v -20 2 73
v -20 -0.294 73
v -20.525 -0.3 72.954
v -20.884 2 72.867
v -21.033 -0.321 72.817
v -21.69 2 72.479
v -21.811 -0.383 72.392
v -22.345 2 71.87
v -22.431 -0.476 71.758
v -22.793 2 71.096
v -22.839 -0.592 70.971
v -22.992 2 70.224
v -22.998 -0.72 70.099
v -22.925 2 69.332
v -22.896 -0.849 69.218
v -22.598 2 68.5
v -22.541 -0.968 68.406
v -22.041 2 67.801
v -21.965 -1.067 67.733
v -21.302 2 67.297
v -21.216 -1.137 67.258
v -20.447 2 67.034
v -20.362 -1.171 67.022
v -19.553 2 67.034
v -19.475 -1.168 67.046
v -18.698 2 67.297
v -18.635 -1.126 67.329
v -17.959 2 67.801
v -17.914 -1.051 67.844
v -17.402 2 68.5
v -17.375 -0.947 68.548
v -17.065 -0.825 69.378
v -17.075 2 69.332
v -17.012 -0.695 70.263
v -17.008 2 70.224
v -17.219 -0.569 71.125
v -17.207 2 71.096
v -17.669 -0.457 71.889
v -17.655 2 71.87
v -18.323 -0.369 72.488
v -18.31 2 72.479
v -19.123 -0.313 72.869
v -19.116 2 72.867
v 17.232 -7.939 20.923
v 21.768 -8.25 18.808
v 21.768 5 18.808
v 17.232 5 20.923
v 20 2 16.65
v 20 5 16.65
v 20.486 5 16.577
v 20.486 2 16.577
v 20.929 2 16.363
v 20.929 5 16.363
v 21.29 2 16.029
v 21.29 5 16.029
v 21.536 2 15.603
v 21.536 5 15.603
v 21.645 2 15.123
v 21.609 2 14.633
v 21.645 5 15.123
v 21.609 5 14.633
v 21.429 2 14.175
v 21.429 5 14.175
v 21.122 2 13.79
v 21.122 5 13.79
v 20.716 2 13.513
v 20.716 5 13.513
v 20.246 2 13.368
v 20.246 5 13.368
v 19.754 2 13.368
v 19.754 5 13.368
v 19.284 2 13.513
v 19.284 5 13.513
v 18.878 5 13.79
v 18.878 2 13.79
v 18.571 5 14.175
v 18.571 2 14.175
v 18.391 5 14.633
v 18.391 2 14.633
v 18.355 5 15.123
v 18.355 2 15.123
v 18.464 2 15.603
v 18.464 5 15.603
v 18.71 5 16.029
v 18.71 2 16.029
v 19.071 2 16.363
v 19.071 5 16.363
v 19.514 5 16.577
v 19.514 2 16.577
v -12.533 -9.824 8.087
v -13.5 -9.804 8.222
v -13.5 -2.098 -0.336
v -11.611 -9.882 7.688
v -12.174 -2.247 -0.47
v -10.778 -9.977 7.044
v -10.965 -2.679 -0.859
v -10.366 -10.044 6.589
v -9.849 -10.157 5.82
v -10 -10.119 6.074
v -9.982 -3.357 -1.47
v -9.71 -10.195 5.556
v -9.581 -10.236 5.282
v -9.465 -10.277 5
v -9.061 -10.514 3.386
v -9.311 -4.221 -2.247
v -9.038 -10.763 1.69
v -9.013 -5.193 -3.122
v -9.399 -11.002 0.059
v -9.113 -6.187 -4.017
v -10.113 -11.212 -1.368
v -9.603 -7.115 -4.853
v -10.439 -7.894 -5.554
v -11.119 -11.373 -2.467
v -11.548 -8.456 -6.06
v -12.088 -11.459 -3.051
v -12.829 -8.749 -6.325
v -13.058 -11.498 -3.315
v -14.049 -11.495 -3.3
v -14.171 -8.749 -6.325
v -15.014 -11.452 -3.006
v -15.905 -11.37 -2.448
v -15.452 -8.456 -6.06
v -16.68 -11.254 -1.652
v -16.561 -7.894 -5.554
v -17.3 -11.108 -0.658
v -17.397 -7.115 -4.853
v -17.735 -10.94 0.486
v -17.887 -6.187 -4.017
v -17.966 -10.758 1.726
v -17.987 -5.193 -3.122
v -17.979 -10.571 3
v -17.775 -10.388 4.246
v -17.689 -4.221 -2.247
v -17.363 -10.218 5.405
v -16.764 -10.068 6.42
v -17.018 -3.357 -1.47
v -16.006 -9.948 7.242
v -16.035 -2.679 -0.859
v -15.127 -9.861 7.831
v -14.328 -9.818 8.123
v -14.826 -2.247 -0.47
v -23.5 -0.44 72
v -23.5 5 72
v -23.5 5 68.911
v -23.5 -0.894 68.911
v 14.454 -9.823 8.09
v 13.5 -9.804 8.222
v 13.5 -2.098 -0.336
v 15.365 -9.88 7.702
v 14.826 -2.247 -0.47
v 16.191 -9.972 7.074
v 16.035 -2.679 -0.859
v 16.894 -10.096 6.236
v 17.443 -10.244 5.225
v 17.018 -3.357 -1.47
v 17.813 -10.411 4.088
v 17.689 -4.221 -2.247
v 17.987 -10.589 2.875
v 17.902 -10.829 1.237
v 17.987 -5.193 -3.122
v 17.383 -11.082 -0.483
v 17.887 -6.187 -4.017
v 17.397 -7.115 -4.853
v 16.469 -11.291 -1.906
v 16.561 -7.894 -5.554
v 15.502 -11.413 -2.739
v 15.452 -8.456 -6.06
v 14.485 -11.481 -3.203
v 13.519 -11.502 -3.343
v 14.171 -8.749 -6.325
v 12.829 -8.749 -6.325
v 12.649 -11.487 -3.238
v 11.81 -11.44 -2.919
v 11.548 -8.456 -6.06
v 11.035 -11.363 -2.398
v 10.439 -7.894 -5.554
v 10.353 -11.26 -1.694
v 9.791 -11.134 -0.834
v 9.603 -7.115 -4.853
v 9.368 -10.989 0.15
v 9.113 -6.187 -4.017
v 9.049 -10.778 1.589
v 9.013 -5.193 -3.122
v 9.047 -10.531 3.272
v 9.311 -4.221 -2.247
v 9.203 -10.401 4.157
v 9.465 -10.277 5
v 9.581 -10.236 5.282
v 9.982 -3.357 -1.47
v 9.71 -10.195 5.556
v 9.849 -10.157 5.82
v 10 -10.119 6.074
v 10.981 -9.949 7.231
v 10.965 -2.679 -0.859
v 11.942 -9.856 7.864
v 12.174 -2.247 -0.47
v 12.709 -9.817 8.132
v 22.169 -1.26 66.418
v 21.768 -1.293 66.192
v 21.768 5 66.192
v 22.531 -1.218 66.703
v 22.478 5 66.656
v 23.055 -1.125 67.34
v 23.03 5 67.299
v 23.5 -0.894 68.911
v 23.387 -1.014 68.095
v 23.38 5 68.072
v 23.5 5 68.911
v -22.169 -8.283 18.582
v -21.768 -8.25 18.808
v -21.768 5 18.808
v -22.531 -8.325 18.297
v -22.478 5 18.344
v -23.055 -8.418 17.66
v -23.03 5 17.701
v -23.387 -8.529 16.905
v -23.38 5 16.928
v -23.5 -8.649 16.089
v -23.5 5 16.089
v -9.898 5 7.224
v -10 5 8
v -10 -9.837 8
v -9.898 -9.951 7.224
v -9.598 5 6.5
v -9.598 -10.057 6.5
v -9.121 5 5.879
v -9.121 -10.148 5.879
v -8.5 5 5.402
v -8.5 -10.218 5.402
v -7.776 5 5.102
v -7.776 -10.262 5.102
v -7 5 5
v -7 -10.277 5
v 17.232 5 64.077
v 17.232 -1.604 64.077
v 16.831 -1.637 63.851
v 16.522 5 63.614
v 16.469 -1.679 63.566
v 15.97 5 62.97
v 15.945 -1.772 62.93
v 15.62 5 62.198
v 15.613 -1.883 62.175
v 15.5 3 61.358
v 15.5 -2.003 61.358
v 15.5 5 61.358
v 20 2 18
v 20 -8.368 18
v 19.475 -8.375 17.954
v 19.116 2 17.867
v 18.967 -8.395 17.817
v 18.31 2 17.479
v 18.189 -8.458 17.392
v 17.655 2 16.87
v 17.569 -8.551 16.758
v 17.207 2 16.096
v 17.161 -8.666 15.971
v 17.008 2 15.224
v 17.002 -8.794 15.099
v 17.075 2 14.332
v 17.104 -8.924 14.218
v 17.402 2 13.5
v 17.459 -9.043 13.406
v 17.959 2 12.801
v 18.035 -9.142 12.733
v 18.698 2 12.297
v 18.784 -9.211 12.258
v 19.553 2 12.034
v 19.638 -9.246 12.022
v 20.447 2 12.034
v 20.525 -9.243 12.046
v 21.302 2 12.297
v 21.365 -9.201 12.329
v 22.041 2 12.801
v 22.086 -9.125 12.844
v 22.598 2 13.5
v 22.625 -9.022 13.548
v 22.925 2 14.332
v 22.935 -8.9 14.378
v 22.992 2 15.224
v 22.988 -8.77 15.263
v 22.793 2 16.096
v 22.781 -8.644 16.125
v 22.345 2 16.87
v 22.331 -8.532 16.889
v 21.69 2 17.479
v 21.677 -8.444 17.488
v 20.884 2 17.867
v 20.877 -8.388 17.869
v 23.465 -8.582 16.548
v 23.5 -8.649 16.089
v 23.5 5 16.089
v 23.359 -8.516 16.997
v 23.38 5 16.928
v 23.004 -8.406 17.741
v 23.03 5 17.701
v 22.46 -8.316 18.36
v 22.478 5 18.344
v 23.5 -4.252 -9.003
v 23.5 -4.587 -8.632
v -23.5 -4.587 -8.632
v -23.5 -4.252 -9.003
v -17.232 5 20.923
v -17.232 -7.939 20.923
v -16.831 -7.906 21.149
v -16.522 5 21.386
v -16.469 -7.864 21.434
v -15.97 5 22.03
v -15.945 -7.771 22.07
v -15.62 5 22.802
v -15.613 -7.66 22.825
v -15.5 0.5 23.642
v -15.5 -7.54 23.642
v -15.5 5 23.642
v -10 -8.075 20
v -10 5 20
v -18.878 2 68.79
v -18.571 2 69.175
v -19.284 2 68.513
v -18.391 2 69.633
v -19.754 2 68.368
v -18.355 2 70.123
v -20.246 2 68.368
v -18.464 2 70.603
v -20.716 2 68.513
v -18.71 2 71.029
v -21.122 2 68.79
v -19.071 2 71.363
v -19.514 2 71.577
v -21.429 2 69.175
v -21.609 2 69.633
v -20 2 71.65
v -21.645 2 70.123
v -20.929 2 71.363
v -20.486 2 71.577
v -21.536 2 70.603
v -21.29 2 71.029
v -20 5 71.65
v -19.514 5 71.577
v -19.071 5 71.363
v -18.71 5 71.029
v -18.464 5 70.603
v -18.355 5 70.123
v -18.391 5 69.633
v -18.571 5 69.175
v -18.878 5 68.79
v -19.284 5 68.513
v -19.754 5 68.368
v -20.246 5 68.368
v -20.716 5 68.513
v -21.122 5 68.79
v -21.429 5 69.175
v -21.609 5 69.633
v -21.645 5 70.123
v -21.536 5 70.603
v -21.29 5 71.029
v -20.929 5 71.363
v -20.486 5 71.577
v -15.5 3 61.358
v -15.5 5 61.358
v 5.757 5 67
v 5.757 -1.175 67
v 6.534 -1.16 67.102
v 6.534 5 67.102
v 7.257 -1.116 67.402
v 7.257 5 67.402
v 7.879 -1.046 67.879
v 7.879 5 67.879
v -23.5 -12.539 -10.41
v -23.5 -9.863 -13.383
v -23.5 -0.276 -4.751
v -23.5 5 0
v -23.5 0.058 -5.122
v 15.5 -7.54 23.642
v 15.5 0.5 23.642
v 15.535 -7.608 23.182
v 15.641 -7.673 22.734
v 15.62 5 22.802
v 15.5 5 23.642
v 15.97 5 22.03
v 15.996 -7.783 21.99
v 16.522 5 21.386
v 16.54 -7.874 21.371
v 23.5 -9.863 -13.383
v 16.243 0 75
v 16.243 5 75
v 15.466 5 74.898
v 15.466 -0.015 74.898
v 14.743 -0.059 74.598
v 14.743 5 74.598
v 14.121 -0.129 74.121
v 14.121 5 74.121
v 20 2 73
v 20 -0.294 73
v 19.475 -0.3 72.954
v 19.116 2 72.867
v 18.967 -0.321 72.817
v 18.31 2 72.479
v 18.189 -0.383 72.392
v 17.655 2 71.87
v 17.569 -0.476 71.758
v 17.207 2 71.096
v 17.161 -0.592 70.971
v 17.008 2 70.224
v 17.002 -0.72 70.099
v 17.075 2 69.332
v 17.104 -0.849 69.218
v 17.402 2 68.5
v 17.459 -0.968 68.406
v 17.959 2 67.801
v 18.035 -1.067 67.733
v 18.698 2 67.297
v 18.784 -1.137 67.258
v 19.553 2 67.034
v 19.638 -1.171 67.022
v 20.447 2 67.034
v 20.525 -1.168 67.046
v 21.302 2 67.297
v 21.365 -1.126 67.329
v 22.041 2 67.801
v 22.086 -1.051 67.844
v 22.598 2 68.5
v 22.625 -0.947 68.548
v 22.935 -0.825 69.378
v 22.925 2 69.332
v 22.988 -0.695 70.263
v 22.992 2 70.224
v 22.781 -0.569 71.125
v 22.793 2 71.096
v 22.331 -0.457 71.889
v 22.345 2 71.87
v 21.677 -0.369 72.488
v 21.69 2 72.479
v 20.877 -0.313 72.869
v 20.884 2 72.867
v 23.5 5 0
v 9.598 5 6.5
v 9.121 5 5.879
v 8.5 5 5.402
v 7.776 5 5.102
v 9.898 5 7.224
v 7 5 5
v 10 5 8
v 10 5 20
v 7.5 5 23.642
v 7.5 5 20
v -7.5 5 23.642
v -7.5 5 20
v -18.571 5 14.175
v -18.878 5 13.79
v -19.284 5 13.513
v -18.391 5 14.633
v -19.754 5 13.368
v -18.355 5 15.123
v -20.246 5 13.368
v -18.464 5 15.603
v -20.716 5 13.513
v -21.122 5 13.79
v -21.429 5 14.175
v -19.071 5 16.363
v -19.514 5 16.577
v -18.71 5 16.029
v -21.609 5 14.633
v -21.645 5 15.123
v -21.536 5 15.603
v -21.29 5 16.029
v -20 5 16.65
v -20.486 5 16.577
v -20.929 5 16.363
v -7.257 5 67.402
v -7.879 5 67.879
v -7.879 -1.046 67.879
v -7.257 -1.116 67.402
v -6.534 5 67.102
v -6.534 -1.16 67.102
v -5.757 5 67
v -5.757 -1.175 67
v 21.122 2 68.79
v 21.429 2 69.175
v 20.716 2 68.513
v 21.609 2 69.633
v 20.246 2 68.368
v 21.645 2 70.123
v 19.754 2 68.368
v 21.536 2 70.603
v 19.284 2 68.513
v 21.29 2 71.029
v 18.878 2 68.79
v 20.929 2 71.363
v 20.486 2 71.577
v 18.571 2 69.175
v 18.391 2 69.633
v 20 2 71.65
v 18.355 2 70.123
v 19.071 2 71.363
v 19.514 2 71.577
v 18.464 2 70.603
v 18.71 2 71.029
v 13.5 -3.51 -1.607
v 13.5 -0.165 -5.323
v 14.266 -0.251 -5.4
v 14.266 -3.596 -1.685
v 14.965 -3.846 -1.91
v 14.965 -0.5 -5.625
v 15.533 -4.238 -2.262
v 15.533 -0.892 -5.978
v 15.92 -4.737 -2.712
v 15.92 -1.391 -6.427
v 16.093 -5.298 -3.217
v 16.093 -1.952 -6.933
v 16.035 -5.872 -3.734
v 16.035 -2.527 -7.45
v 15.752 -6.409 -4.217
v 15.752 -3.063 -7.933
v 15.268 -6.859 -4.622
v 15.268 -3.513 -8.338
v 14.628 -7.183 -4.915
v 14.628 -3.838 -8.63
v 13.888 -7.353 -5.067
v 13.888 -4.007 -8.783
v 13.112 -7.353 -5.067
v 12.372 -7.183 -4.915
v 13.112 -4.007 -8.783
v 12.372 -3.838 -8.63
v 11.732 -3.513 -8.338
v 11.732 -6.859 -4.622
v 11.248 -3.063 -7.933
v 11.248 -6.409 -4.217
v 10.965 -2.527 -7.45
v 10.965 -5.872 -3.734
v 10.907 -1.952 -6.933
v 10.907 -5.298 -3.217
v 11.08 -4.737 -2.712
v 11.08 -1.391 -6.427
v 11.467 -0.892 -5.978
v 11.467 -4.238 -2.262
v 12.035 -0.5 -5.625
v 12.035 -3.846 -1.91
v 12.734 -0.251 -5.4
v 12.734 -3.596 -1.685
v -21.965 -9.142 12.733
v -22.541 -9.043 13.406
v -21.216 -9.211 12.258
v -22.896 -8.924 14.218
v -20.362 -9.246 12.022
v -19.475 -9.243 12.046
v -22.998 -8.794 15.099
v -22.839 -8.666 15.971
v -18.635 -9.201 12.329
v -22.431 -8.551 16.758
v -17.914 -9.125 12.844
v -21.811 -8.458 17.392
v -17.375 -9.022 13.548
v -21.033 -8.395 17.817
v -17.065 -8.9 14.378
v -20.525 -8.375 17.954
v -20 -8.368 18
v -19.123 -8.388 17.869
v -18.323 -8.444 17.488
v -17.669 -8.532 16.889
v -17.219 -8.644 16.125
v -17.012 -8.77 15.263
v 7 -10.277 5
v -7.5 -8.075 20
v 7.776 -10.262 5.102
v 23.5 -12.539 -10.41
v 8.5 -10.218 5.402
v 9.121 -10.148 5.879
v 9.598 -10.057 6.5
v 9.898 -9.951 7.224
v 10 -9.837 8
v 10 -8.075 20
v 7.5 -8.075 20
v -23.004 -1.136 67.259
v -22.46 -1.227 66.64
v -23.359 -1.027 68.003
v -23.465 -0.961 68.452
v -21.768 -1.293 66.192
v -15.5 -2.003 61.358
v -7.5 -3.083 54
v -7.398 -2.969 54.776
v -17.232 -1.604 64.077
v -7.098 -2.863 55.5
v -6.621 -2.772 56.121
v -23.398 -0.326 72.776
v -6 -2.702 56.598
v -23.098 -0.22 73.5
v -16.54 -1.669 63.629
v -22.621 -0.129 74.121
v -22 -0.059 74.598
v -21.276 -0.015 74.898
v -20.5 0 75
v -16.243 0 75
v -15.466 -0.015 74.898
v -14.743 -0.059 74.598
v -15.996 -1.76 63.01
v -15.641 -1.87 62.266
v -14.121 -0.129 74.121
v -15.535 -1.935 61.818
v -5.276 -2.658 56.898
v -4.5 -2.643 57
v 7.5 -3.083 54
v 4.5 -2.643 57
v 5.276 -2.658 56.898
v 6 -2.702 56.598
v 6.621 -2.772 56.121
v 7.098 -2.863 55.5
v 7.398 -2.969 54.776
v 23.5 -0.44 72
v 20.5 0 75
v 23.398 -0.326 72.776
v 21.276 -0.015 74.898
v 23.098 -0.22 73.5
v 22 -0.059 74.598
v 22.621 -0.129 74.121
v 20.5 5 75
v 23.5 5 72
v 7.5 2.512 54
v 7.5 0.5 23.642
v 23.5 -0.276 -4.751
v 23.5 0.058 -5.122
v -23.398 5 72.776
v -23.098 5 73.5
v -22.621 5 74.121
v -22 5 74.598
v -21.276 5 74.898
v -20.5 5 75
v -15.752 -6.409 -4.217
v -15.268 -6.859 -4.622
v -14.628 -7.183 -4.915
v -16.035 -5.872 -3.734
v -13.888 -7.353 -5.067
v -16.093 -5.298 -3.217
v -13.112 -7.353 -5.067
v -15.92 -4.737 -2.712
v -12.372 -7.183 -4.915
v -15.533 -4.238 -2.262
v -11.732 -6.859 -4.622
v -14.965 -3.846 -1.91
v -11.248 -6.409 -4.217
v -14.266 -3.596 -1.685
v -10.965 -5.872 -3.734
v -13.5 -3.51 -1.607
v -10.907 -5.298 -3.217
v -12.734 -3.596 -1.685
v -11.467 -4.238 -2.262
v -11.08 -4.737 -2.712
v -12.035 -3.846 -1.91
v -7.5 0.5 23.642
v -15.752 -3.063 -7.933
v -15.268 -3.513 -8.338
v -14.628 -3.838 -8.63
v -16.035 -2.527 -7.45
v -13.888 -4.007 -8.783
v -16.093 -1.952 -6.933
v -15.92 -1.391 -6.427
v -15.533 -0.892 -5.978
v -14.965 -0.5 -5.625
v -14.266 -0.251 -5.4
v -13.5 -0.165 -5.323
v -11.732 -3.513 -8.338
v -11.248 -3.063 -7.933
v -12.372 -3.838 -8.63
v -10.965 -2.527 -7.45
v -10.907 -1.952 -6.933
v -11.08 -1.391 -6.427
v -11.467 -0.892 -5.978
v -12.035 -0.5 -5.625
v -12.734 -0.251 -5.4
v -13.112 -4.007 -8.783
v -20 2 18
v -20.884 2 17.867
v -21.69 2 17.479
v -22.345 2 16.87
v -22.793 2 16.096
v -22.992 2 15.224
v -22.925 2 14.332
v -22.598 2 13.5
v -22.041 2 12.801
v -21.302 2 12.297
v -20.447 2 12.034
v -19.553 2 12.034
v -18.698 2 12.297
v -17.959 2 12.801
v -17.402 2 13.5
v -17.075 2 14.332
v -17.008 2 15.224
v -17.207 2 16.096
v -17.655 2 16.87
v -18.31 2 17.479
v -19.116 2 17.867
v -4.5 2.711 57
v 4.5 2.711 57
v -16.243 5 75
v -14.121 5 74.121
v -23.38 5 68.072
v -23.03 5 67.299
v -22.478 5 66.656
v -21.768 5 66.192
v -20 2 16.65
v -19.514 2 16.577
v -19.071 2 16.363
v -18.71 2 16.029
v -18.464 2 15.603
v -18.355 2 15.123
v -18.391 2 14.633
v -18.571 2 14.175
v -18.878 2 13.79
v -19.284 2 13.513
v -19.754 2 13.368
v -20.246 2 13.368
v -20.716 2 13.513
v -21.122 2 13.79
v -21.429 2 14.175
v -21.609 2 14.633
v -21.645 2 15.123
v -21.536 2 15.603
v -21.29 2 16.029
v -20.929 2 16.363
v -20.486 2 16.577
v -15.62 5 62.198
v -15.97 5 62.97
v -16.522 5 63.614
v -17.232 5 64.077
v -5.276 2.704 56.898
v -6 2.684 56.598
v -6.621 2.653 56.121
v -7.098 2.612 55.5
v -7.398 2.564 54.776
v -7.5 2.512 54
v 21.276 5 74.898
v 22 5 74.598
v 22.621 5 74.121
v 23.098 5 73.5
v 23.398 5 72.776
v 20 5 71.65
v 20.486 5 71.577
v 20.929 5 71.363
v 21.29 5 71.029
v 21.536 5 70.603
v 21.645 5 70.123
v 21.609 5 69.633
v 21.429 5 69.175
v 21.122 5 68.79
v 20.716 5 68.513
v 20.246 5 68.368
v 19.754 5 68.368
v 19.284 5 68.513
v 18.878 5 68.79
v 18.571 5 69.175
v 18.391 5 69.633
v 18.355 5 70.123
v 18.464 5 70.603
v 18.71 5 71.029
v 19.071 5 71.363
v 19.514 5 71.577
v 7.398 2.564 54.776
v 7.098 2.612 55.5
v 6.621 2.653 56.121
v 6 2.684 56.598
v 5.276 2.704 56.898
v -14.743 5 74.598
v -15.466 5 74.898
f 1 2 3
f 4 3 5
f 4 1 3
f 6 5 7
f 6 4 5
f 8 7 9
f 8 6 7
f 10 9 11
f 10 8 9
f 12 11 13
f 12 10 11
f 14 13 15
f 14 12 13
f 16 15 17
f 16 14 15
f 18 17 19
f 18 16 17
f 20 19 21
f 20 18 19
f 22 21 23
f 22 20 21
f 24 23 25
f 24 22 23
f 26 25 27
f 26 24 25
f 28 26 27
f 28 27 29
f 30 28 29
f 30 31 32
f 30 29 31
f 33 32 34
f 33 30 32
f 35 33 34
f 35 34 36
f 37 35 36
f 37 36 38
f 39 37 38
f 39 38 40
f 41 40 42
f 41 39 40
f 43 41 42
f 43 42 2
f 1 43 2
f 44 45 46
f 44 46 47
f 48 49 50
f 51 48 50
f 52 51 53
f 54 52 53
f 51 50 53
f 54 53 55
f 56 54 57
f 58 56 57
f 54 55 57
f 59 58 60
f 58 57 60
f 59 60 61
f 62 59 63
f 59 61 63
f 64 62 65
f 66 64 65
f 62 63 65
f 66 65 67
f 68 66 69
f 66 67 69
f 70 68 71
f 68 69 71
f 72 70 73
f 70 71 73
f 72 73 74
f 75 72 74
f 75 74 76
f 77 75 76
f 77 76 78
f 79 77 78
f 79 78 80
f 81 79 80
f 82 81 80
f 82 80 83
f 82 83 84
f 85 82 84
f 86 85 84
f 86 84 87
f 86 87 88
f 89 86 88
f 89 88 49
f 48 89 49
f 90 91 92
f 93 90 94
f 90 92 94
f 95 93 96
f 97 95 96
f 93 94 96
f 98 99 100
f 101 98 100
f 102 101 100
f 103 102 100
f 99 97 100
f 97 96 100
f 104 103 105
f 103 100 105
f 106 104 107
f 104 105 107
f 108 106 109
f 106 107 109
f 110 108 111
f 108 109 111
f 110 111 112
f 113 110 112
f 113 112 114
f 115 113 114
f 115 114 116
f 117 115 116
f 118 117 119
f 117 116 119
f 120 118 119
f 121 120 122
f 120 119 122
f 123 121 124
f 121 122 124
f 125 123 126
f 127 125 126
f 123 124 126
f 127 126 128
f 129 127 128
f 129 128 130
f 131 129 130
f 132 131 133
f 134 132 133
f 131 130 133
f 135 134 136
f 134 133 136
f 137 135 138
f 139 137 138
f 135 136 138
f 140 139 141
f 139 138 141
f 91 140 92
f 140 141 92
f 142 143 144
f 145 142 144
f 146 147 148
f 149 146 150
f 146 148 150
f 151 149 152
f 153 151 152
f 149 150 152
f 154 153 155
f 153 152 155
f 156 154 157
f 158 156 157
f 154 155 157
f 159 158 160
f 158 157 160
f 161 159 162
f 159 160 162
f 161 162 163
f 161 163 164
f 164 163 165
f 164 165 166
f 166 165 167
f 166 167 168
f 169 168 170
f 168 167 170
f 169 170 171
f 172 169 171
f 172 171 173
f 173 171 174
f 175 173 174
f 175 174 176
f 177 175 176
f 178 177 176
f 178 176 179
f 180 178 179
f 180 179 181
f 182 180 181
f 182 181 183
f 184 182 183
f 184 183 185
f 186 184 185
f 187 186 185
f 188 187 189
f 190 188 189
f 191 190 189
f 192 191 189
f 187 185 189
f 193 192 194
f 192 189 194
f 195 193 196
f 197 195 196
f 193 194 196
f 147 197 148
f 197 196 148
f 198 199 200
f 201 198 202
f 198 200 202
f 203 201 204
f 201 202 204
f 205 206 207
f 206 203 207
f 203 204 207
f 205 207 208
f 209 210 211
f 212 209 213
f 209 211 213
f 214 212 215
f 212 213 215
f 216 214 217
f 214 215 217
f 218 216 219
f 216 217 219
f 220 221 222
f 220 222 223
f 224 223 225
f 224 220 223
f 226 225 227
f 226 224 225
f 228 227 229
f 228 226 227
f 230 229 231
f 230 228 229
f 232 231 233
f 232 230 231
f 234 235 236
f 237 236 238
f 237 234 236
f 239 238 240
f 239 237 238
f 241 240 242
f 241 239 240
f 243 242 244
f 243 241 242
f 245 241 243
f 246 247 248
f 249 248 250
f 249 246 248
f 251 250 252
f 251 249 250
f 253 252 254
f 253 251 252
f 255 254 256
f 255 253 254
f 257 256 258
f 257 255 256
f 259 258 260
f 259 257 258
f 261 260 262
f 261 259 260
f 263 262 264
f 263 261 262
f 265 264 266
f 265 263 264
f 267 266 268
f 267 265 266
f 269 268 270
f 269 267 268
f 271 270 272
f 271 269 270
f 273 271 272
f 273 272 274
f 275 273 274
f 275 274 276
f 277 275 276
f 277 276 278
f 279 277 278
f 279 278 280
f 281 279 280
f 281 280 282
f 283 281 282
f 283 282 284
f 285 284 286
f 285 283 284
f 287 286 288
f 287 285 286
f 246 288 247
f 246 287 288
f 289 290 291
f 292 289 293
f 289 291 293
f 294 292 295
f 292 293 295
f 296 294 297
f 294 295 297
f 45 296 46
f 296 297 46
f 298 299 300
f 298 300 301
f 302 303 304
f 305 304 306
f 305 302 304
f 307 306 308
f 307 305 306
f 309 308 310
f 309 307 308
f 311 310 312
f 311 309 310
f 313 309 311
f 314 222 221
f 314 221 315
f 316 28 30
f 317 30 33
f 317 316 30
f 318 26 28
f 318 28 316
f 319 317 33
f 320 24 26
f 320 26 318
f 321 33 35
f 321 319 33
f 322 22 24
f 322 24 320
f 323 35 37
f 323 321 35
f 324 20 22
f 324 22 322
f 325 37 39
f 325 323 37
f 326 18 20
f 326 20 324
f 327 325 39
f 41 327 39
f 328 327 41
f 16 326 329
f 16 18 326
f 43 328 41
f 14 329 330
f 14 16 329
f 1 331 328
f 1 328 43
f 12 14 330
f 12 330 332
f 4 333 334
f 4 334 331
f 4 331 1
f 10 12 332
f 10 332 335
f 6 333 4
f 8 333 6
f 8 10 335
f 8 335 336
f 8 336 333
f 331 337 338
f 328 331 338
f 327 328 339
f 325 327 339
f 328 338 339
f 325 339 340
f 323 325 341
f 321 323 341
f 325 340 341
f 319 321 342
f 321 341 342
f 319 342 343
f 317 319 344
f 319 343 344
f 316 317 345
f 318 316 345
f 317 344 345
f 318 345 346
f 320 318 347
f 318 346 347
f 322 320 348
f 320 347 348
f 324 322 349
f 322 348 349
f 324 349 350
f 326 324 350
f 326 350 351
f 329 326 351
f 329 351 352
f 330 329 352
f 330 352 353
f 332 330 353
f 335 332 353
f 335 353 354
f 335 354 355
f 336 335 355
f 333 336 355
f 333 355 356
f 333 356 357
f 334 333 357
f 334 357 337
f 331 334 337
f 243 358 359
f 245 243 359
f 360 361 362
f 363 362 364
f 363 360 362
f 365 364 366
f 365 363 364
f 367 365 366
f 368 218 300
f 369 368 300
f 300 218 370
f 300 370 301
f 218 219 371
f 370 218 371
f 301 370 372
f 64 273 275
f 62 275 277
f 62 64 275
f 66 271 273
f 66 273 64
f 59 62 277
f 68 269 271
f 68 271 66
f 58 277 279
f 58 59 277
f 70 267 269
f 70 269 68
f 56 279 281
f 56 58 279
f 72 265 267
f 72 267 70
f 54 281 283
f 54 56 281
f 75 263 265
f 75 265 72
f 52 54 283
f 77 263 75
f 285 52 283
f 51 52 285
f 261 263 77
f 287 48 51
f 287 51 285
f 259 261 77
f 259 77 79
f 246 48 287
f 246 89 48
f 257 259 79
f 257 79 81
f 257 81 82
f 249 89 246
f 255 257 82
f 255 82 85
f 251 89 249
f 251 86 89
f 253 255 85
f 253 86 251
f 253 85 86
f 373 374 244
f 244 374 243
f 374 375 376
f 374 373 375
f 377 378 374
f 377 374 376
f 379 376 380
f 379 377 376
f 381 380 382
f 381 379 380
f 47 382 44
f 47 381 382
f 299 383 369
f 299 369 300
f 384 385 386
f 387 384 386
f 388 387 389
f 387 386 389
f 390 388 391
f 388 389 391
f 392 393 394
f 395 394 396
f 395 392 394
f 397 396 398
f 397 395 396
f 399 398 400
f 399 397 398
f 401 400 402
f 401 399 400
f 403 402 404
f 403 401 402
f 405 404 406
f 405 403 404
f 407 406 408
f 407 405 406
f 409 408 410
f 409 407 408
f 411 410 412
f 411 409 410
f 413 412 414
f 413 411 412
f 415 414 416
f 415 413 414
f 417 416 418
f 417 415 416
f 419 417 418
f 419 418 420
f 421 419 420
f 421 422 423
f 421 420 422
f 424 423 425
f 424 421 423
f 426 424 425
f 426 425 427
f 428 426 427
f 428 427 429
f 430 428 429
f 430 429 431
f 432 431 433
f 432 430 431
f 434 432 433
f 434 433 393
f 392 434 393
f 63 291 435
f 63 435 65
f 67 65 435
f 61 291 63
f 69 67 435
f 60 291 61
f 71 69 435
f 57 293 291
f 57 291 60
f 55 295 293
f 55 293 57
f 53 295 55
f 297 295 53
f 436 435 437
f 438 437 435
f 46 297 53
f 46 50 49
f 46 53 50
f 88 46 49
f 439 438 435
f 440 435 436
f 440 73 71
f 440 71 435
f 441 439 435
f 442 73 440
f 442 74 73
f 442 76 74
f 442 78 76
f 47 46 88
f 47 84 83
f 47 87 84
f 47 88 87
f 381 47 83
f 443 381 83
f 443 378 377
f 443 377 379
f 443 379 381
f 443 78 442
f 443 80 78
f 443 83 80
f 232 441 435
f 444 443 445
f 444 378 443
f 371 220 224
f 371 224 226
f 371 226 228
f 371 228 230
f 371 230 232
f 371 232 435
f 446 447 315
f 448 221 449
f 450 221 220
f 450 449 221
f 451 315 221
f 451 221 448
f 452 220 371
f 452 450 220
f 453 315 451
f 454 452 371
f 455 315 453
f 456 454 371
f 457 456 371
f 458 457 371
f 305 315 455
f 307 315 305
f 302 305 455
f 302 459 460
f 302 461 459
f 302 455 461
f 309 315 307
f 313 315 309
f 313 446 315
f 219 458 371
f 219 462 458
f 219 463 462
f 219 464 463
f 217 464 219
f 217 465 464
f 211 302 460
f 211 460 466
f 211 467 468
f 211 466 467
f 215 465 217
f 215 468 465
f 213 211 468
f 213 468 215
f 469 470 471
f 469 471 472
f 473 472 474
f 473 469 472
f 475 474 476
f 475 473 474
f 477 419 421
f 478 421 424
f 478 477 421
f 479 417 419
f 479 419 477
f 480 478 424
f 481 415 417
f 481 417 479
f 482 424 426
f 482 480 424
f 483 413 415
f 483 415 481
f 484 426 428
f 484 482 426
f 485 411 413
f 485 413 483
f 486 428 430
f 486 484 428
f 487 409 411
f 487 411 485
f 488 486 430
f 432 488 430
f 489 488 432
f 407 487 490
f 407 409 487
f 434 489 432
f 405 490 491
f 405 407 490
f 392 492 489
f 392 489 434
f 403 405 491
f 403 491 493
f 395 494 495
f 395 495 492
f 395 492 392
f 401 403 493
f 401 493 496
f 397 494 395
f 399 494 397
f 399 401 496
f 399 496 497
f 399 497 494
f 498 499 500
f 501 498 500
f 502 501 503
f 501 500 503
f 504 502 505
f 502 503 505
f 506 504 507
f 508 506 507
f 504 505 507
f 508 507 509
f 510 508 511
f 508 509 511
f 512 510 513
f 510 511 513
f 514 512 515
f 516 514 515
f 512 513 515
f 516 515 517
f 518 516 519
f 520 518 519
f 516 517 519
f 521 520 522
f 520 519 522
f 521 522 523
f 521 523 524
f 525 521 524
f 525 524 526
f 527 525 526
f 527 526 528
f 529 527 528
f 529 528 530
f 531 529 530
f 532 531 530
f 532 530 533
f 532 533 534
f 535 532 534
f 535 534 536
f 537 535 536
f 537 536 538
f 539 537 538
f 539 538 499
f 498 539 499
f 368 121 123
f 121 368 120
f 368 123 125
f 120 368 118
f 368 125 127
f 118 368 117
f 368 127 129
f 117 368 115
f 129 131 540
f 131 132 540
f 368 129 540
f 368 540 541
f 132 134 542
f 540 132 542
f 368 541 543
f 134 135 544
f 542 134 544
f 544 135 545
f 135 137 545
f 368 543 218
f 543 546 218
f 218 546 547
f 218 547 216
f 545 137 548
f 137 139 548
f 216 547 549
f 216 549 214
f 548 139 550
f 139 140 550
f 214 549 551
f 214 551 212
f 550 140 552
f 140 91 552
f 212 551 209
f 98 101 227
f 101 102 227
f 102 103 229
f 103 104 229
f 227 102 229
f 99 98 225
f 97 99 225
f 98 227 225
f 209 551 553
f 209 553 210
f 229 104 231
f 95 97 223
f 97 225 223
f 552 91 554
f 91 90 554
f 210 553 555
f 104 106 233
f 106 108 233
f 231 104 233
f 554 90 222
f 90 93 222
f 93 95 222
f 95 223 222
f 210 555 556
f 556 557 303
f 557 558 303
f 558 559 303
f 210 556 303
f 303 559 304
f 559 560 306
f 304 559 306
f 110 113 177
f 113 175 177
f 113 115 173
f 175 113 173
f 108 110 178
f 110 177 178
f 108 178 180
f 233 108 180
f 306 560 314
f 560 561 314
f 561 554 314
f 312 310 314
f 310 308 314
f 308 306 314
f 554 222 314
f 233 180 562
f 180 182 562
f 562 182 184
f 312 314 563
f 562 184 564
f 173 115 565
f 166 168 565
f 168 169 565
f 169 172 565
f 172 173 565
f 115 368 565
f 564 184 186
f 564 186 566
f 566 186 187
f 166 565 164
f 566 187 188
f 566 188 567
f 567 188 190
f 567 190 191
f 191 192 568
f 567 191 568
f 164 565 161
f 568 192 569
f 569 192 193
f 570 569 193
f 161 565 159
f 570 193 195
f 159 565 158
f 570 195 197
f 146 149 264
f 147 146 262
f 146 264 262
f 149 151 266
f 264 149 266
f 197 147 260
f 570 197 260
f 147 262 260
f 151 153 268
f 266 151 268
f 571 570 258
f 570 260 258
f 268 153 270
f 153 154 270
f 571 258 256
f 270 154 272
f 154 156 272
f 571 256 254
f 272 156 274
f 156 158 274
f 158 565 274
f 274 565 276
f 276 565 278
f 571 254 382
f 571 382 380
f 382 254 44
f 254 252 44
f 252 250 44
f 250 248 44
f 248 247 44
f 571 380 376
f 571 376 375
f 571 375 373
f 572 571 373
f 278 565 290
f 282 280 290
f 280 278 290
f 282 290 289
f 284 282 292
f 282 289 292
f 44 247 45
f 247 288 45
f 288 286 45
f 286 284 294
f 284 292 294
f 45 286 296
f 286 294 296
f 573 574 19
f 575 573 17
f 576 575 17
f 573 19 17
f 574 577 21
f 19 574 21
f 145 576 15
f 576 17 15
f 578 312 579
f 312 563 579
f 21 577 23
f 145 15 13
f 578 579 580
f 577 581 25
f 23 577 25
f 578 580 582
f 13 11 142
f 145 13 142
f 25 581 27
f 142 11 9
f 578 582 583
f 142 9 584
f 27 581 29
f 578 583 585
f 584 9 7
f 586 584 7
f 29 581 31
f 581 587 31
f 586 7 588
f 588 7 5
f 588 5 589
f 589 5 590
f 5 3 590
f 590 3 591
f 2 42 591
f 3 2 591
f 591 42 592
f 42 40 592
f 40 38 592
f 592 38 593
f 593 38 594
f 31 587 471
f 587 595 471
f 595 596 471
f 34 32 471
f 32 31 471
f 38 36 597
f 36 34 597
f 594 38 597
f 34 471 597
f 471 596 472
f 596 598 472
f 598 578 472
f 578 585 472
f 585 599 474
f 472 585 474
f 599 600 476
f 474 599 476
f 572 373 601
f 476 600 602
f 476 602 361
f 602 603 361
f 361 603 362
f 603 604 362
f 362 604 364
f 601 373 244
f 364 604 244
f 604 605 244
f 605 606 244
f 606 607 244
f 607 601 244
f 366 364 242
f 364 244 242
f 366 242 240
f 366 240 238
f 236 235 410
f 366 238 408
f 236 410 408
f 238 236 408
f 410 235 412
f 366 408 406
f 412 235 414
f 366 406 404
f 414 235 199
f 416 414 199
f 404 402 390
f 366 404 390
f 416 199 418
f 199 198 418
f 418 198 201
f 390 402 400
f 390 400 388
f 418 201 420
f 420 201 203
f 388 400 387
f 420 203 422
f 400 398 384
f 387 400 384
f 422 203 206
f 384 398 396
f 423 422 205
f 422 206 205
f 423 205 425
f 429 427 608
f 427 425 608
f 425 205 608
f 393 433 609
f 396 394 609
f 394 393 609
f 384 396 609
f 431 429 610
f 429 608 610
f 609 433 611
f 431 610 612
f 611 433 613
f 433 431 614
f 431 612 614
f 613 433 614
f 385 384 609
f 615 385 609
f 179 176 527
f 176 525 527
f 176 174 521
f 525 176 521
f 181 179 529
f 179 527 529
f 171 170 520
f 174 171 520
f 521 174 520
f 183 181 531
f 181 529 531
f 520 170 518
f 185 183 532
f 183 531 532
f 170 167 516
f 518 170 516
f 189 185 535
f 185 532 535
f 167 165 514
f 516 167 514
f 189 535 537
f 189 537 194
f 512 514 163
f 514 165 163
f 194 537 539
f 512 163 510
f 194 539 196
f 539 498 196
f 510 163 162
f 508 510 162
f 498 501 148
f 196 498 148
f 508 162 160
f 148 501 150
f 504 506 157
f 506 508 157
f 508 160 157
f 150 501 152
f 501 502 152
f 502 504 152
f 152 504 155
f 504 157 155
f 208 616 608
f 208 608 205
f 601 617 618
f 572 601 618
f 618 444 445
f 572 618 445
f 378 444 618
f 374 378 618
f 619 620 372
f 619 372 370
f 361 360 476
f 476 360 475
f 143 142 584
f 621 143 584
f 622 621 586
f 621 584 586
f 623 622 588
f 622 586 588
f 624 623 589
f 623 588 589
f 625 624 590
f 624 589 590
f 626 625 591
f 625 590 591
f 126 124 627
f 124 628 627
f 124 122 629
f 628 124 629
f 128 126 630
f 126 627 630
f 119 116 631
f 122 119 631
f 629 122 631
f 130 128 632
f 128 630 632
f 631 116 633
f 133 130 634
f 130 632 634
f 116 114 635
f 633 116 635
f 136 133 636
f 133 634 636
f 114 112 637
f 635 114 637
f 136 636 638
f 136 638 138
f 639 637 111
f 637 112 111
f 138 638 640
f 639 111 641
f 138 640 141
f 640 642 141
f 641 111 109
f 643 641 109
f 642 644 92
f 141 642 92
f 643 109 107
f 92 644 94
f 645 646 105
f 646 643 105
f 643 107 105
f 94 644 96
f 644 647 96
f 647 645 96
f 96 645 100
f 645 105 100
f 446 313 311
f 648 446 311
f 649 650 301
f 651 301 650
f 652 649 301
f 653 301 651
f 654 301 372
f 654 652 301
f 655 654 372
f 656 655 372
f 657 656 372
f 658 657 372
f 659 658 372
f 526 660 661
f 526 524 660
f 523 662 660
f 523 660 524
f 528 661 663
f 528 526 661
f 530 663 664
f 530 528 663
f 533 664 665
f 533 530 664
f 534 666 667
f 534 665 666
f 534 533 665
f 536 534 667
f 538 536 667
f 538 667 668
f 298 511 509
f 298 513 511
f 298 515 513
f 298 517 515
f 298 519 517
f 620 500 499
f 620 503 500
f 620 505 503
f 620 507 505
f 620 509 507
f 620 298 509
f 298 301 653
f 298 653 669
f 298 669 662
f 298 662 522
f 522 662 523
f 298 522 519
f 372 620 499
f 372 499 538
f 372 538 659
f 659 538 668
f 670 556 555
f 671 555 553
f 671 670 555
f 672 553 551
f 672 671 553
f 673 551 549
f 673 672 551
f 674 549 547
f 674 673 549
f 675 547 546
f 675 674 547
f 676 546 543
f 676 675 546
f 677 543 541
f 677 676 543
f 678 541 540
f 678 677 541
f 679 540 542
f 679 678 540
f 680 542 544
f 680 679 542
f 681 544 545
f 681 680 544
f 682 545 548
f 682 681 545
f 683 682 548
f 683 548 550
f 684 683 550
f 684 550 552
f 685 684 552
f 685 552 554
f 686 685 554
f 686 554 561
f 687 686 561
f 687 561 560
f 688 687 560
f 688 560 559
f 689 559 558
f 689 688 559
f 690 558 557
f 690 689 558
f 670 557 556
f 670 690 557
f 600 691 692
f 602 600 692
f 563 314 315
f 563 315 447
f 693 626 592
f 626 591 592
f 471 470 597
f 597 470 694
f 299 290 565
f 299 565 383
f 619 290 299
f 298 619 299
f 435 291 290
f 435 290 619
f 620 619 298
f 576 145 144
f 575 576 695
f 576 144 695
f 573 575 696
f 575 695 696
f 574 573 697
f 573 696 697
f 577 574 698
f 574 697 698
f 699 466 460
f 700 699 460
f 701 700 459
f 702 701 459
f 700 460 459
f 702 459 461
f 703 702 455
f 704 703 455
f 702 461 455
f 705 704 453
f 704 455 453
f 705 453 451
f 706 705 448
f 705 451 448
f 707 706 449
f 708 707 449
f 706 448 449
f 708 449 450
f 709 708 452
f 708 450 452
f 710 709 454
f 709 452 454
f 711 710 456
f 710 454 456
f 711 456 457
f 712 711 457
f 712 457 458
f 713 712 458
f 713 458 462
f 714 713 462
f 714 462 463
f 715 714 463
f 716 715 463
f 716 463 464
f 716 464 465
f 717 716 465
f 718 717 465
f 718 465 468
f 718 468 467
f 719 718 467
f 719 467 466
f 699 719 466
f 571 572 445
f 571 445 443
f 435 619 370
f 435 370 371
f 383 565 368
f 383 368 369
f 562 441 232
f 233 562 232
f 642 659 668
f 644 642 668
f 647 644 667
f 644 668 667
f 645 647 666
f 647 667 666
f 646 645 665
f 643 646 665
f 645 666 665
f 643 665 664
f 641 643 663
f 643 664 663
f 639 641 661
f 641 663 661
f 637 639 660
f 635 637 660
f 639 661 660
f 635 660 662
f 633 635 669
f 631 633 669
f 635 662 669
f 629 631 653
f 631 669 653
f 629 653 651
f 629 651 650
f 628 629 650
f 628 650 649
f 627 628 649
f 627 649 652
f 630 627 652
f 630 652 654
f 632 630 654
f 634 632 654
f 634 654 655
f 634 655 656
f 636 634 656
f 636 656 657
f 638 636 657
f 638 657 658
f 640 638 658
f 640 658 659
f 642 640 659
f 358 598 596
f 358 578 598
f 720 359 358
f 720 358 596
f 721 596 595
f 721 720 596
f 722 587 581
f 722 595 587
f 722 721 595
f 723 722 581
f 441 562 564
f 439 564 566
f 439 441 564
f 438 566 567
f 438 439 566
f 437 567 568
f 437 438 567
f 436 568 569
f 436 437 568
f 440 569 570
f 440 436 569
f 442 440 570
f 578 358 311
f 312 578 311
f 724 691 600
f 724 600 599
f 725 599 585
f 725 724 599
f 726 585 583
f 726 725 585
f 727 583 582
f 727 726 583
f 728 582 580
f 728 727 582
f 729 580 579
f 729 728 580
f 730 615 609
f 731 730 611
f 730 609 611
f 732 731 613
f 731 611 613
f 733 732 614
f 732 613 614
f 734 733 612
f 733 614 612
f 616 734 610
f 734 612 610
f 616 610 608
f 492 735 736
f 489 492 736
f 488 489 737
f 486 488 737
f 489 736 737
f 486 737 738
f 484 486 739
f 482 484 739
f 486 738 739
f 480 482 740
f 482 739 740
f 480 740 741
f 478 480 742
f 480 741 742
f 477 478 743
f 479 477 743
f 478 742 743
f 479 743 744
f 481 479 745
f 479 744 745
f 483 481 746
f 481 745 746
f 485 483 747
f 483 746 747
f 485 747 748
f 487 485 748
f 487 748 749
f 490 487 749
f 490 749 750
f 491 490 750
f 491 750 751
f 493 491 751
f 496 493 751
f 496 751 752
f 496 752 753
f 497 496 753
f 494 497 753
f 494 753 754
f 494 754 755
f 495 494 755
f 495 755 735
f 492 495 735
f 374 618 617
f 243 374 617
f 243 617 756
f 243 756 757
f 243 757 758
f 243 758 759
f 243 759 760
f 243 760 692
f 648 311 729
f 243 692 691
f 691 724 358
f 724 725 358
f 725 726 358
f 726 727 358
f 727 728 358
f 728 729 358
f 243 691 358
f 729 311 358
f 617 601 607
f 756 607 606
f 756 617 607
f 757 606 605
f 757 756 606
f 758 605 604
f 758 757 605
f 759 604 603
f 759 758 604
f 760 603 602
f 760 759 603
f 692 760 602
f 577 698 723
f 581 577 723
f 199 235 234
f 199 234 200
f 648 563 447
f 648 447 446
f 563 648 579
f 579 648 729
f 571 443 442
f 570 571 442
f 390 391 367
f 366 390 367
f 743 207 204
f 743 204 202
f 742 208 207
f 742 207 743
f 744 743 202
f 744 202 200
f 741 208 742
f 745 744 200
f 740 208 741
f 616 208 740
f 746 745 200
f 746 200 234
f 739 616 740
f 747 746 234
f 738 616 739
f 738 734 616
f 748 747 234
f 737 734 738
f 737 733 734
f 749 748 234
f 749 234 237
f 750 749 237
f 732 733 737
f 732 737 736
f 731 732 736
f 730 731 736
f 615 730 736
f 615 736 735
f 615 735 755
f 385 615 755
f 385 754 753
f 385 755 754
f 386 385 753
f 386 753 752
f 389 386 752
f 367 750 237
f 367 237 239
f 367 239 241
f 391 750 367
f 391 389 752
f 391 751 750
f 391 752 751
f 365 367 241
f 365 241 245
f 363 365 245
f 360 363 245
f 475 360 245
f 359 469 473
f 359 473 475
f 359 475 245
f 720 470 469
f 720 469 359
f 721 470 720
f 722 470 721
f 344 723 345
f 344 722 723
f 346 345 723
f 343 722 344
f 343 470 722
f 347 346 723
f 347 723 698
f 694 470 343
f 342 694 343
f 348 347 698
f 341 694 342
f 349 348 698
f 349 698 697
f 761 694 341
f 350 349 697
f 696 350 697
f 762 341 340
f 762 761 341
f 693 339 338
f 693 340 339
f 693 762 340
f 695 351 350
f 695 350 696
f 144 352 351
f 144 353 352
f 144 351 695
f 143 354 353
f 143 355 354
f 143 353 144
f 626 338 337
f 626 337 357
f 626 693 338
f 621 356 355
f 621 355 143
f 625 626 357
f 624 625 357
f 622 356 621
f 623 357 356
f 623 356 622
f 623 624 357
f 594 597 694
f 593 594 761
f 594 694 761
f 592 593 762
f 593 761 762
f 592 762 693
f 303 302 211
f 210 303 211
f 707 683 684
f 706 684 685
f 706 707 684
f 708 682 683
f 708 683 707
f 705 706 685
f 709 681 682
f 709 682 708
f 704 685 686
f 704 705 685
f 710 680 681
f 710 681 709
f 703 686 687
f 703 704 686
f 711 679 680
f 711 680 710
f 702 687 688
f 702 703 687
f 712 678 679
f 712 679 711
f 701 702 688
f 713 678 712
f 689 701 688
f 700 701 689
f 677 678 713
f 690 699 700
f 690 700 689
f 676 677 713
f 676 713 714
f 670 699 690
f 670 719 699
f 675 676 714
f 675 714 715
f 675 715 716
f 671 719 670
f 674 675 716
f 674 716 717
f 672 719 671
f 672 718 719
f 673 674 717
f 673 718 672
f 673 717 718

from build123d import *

# Parameters (mm, degrees)
EXTRUDE_2_DEPTH     = 5
SKETCH_3_R          = 1.65
CUT_EXTRUDE_1_DEPTH = 79.754364958
EXTRUDE_3_DEPTH     = 23.5
SKETCH_6_R          = 2.6
CUT_EXTRUDE_3_DEPTH = 83.719354566
CUT_EXTRUDE_4_REACH = 89.719
CUT_EXTRUDE_START   = -5
SKETCH_7_R          = 4.5
CUT_EXTRUDE_5_REACH = 85.529
CUT_EXTRUDE_START_2 = 3
SKETCH_8_R          = 3
CUT_EXTRUDE_2_DEPTH = 81.528760183
FILLET_1_R          = 3
CUT_EXTRUDE_7_DEPTH = 86.458978623


with BuildPart() as part:
    # 草图2 → 凸台-拉伸2 (new body)
    with BuildSketch(Plane(origin=(0, 0, 0), x_dir=(1, 0, 0), z_dir=(0, 1, 0))):
        Polygon((0, 0), (23.5, 0), (23.5, -14), (23.5, -75), (0, -75), align=None)
    extrude_2 = extrude(amount=EXTRUDE_2_DEPTH)

    # 镜向1: 凸台-拉伸2 across plane
    add(extrude_2.mirror(Plane(origin=(0, 5, 75), x_dir=(0, 0, 1), z_dir=(1, 0, 0))))

    # 草图3 → 切除-拉伸1 (cut, through all)
    with BuildSketch(Plane(origin=(0, 5, 0), x_dir=(1, 0, 0), z_dir=(0, 1, 0))):
        with Locations(Location((-20, -15, 0), (0, 0, 270))):
            Circle(SKETCH_3_R)
        with Locations(Location((20, -15, 0), (0, 0, 270))):
            Circle(SKETCH_3_R)
        with Locations(Location((-20, -70, 0), (0, 0, 270))):
            Circle(SKETCH_3_R)
        with Locations(Location((20, -70, 0), (0, 0, 270))):
            Circle(SKETCH_3_R)
    extrude(amount=-CUT_EXTRUDE_1_DEPTH, mode=Mode.SUBTRACT)

    # 草图5 → 凸台-拉伸3 (add, symmetric)
    with BuildSketch(Plane(origin=(0, 0, 0), x_dir=(0, 0, -1), z_dir=(1, 0, 0))):
        Polygon((-75, 0), (10.410032825, -12.539418935), (13.382612127, -9.86289651), (0, 5), (0, 0), align=None)
        Polygon((4.750827305, -0.276328261), (8.631784822, -4.586568249), (9.003357235, -4.252002945), (5.122399718, 0.058237042), align=None)
    extrude(amount=EXTRUDE_3_DEPTH, both=True)

    # 草图6 → 切除-拉伸3 (cut, through all)
    with BuildSketch(Plane(origin=(0, 2.573244145, -2.857877151), x_dir=(1, 0, 0), z_dir=(0, 0.6691306063588544, -0.7431448254773979))):
        with Locations(Location((-13.5, 6.284275873, 0), (0, 0, 270))):
            Circle(SKETCH_6_R)
        with Locations(Location((13.5, 6.284275873, 0), (0, 0, 270))):
            Circle(SKETCH_6_R)
    extrude(amount=-CUT_EXTRUDE_3_DEPTH, mode=Mode.SUBTRACT)

    # 切除-拉伸4: up to this plane
    cut_extrude_4_end = Plane(origin=(23.5, -10.778746663, 1.582474746), z_dir=(0, 0.9893939239349117, -0.145257231423012))
    # 草图7 → 切除-拉伸4 (cut, up to the surface)
    with BuildSketch(Plane(origin=(0, 2.573244145, -2.857877151), x_dir=(1, 0, 0), z_dir=(0, 0.6691306063588544, -0.7431448254773979)).offset(CUT_EXTRUDE_START), mode=Mode.PRIVATE) as cut_extrude_4_sk1:
        with Locations(Location((-13.5, 6.284275873, 0), (0, 0, 270))):
            Circle(SKETCH_7_R)
    cut_extrude_4_tool1 = split(extrude(cut_extrude_4_sk1.sketch, amount=-CUT_EXTRUDE_4_REACH, mode=Mode.PRIVATE), bisect_by=cut_extrude_4_end, keep=Keep.BOTH, mode=Mode.PRIVATE)
    add(cut_extrude_4_tool1.solids().sort_by_distance((-13.5, -5.442536, -3.347154))[0], mode=Mode.SUBTRACT)
    # 草图7 → 切除-拉伸4 (cut, up to the surface)
    with BuildSketch(Plane(origin=(0, 2.573244145, -2.857877151), x_dir=(1, 0, 0), z_dir=(0, 0.6691306063588544, -0.7431448254773979)).offset(CUT_EXTRUDE_START), mode=Mode.PRIVATE) as cut_extrude_4_sk2:
        with Locations(Location((13.5, 6.284275873, 0), (0, 0, 270))):
            Circle(SKETCH_7_R)
    cut_extrude_4_tool2 = split(extrude(cut_extrude_4_sk2.sketch, amount=-CUT_EXTRUDE_4_REACH, mode=Mode.PRIVATE), bisect_by=cut_extrude_4_end, keep=Keep.BOTH, mode=Mode.PRIVATE)
    add(cut_extrude_4_tool2.solids().sort_by_distance((13.5, -5.442536, -3.347154))[0], mode=Mode.SUBTRACT)

    # 切除-拉伸5: up to this plane
    cut_extrude_5_end = Plane(origin=(23.5, -10.778746663, 1.582474746), z_dir=(0, 0.9893939239349117, -0.145257231423012))
    # 草图8 → 切除-拉伸5 (cut, up to the surface)
    with BuildSketch(Plane.XZ.offset(-5).offset(CUT_EXTRUDE_START_2), mode=Mode.PRIVATE) as cut_extrude_5_sk1:
        with Locations(Location((-20, 15, 0), (0, 0, 90))):
            Circle(SKETCH_8_R)
    cut_extrude_5_tool1 = split(extrude(cut_extrude_5_sk1.sketch, amount=CUT_EXTRUDE_5_REACH, mode=Mode.PRIVATE), bisect_by=cut_extrude_5_end, keep=Keep.BOTH, mode=Mode.PRIVATE)
    add(cut_extrude_5_tool1.solids().sort_by_distance((-20, 2, 15))[0], mode=Mode.SUBTRACT)
    # 草图8 → 切除-拉伸5 (cut, up to the surface)
    with BuildSketch(Plane.XZ.offset(-5).offset(CUT_EXTRUDE_START_2), mode=Mode.PRIVATE) as cut_extrude_5_sk2:
        with Locations(Location((20, 15, 0), (0, 0, 90))):
            Circle(SKETCH_8_R)
    cut_extrude_5_tool2 = split(extrude(cut_extrude_5_sk2.sketch, amount=CUT_EXTRUDE_5_REACH, mode=Mode.PRIVATE), bisect_by=cut_extrude_5_end, keep=Keep.BOTH, mode=Mode.PRIVATE)
    add(cut_extrude_5_tool2.solids().sort_by_distance((20, 2, 15))[0], mode=Mode.SUBTRACT)
    # 草图8 → 切除-拉伸5 (cut, up to the surface)
    with BuildSketch(Plane.XZ.offset(-5).offset(CUT_EXTRUDE_START_2), mode=Mode.PRIVATE) as cut_extrude_5_sk3:
        with Locations(Location((20, 70, 0), (0, 0, 90))):
            Circle(SKETCH_8_R)
    cut_extrude_5_tool3 = split(extrude(cut_extrude_5_sk3.sketch, amount=CUT_EXTRUDE_5_REACH, mode=Mode.PRIVATE), bisect_by=cut_extrude_5_end, keep=Keep.BOTH, mode=Mode.PRIVATE)
    add(cut_extrude_5_tool3.solids().sort_by_distance((20, 2, 70))[0], mode=Mode.SUBTRACT)
    # 草图8 → 切除-拉伸5 (cut, up to the surface)
    with BuildSketch(Plane.XZ.offset(-5).offset(CUT_EXTRUDE_START_2), mode=Mode.PRIVATE) as cut_extrude_5_sk4:
        with Locations(Location((-20, 70, 0), (0, 0, 90))):
            Circle(SKETCH_8_R)
    cut_extrude_5_tool4 = split(extrude(cut_extrude_5_sk4.sketch, amount=CUT_EXTRUDE_5_REACH, mode=Mode.PRIVATE), bisect_by=cut_extrude_5_end, keep=Keep.BOTH, mode=Mode.PRIVATE)
    add(cut_extrude_5_tool4.solids().sort_by_distance((-20, 2, 70))[0], mode=Mode.SUBTRACT)

    # 草图4 → 切除-拉伸2 (cut, through all)
    with BuildSketch(Plane(origin=(0, 5, 0), x_dir=(1, 0, 0), z_dir=(0, 1, 0))):
        Polygon((-10, -5), (-10, -20), (-7.5, -20), (-7.5, -57), (7.5, -57), (7.5, -20), (10, -20), (10, -5), align=None)
        Polygon((-7, -67), (-15, -75), (15, -75), (7, -67), align=None)
        Polygon((-23.5, -18), (-23.5, -67), (-15.5, -63.269538735), (-15.5, -21.730461265), align=None)
        Polygon((23.5, -18), (15.5, -21.730461265), (15.5, -63.269538735), (23.5, -67), align=None)
    extrude(amount=-CUT_EXTRUDE_2_DEPTH, mode=Mode.SUBTRACT)

    # 圆角1
    # the kernel refuses this fillet: 3 mm, written as the material it adds along each edge
    with BuildSketch(Plane(origin=(7.5, 5, 57), x_dir=(0, 0, -1), z_dir=(0, -1, 0))) as fillet_1_piece_1_section:
        with BuildLine():
            CenterArc((FILLET_1_R, -FILLET_1_R), FILLET_1_R, 90, 90)
            Line((0, -FILLET_1_R), (0, 0))
            Line((0, 0), (FILLET_1_R, 0))
        make_face()
    fillet_1_piece_1 = extrude(amount=15.142658402, mode=Mode.PRIVATE)
    fillet_1_piece_1 = split(fillet_1_piece_1, bisect_by=Plane(origin=(6.825500476, -2.66184405, 56.869320354), z_dir=(0, 0.9893939239349115, -0.14525723142301197)), keep=Keep.TOP, mode=Mode.PRIVATE)
    add(fillet_1_piece_1)
    with BuildSketch(Plane(origin=(-7.5, 5, 57), x_dir=(1, 0, 0), z_dir=(0, -1, 0))) as fillet_1_piece_2_section:
        with BuildLine():
            CenterArc((FILLET_1_R, -FILLET_1_R), FILLET_1_R, 90, 90)
            Line((0, -FILLET_1_R), (0, 0))
            Line((0, 0), (FILLET_1_R, 0))
        make_face()
    fillet_1_piece_2 = extrude(amount=15.142658402, mode=Mode.PRIVATE)
    fillet_1_piece_2 = split(fillet_1_piece_2, bisect_by=Plane(origin=(-6.825500476, -2.66184405, 56.869320354), z_dir=(0, 0.9893939239349115, -0.14525723142301197)), keep=Keep.TOP, mode=Mode.PRIVATE)
    add(fillet_1_piece_2)
    with BuildSketch(Plane(origin=(15.5, 5, 21.730461265), x_dir=(0.9063077870366475, 0, -0.4226182617407048), z_dir=(0, -1, 0))) as fillet_1_piece_3_section:
        with BuildLine():
            CenterArc((FILLET_1_R * 0.637070260807, FILLET_1_R), FILLET_1_R, 205, 65)
            Line((-FILLET_1_R * 0.269237526229, FILLET_1_R * 0.577381738259), (0, 0))
            Line((0, 0), (FILLET_1_R * 0.637070260807, 0))
        make_face()
    fillet_1_piece_3 = extrude(amount=17.598759961, mode=Mode.PRIVATE)
    fillet_1_piece_3 = split(fillet_1_piece_3, bisect_by=Plane(origin=(15.879555916, -7.651082655, 22.886004601), z_dir=(0, 0.9893939239349115, -0.14525723142301197)), keep=Keep.TOP, mode=Mode.PRIVATE)
    add(fillet_1_piece_3)
    with BuildSketch(Plane(origin=(15.5, 5, 63.269538735), x_dir=(0.9063077870366488, 0, 0.4226182617407019), z_dir=(0, -1, 0))) as fillet_1_piece_4_section:
        with BuildLine():
            CenterArc((FILLET_1_R * 0.637070260807, -FILLET_1_R), FILLET_1_R, 90, 65)
            Line((-FILLET_1_R * 0.269237526229, -FILLET_1_R * 0.577381738259), (0, 0))
            Line((0, 0), (FILLET_1_R * 0.637070260807, 0))
        make_face()
    fillet_1_piece_4 = extrude(amount=11.500227068, mode=Mode.PRIVATE)
    fillet_1_piece_4 = split(fillet_1_piece_4, bisect_by=Plane(origin=(15.87363951, -1.687245158, 63.507628217), z_dir=(0, 0.9893939239349115, -0.14525723142301197)), keep=Keep.TOP, mode=Mode.PRIVATE)
    add(fillet_1_piece_4)
    with BuildSketch(Plane(origin=(7, 5, 67), x_dir=(-1, 0, 0), z_dir=(0, -1, 0))) as fillet_1_piece_5_section:
        with BuildLine():
            CenterArc((FILLET_1_R * 0.414213562373, -FILLET_1_R), FILLET_1_R, 90, 45)
            Line((-FILLET_1_R * 0.292893218813, -FILLET_1_R * 0.292893218813), (0, 0))
            Line((0, 0), (FILLET_1_R * 0.414213562373, 0))
        make_face()
    fillet_1_piece_5 = extrude(amount=9.281116563, mode=Mode.PRIVATE)
    fillet_1_piece_5 = split(fillet_1_piece_5, bisect_by=Plane(origin=(6.92099422, -1.082611782, 67.625981449), z_dir=(0, 0.9893939239349115, -0.14525723142301197)), keep=Keep.TOP, mode=Mode.PRIVATE)
    add(fillet_1_piece_5)
    with BuildSketch(Plane(origin=(-7, 5, 67), x_dir=(-0.7071067811865526, 0, 0.7071067811865426), z_dir=(0, -1, 0))) as fillet_1_piece_6_section:
        with BuildLine():
            CenterArc((FILLET_1_R * 0.414213562373, -FILLET_1_R), FILLET_1_R, 90, 45)
            Line((-FILLET_1_R * 0.292893218813, -FILLET_1_R * 0.292893218813), (0, 0))
            Line((0, 0), (FILLET_1_R * 0.414213562373, 0))
        make_face()
    fillet_1_piece_6 = extrude(amount=9.281116563, mode=Mode.PRIVATE)
    fillet_1_piece_6 = split(fillet_1_piece_6, bisect_by=Plane(origin=(-6.92099422, -1.082611782, 67.625981449), z_dir=(0, 0.9893939239349115, -0.14525723142301197)), keep=Keep.TOP, mode=Mode.PRIVATE)
    add(fillet_1_piece_6)
    with BuildSketch(Plane(origin=(-15.5, 5, 63.269538735), x_dir=(0, 0, -1), z_dir=(0, -1, 0))) as fillet_1_piece_7_section:
        with BuildLine():
            CenterArc((FILLET_1_R * 0.637070260807, -FILLET_1_R), FILLET_1_R, 90, 65)
            Line((-FILLET_1_R * 0.269237526229, -FILLET_1_R * 0.577381738259), (0, 0))
            Line((0, 0), (FILLET_1_R * 0.637070260807, 0))
        make_face()
    fillet_1_piece_7 = extrude(amount=11.500227068, mode=Mode.PRIVATE)
    fillet_1_piece_7 = split(fillet_1_piece_7, bisect_by=Plane(origin=(-15.87363951, -1.687245158, 63.507628217), z_dir=(0, 0.9893939239349115, -0.14525723142301197)), keep=Keep.TOP, mode=Mode.PRIVATE)
    add(fillet_1_piece_7)
    with BuildSketch(Plane(origin=(-15.5, 5, 21.730461265), x_dir=(-0.9063077870366472, 0, -0.42261826174070566), z_dir=(0, -1, 0))) as fillet_1_piece_8_section:
        with BuildLine():
            CenterArc((FILLET_1_R * 0.637070260807, -FILLET_1_R), FILLET_1_R, 90, 65)
            Line((-FILLET_1_R * 0.269237526229, -FILLET_1_R * 0.577381738259), (0, 0))
            Line((0, 0), (FILLET_1_R * 0.637070260807, 0))
        make_face()
    fillet_1_piece_8 = extrude(amount=17.598759961, mode=Mode.PRIVATE)
    fillet_1_piece_8 = split(fillet_1_piece_8, bisect_by=Plane(origin=(-15.879555916, -7.651082655, 22.886004601), z_dir=(0, 0.9893939239349115, -0.14525723142301197)), keep=Keep.TOP, mode=Mode.PRIVATE)
    add(fillet_1_piece_8)
    with BuildSketch(Plane(origin=(10, 5, 5), x_dir=(-1, 0, 0), z_dir=(0, -1, 0))) as fillet_1_piece_9_section:
        with BuildLine():
            CenterArc((FILLET_1_R, -FILLET_1_R), FILLET_1_R, 90, 90)
            Line((0, -FILLET_1_R), (0, 0))
            Line((0, 0), (FILLET_1_R, 0))
        make_face()
    fillet_1_piece_9 = extrude(amount=21.652323405, mode=Mode.PRIVATE)
    fillet_1_piece_9 = split(fillet_1_piece_9, bisect_by=Plane(origin=(9.315353327, -10.016611336, 6.773624643), z_dir=(0, 0.9893939239349115, -0.14525723142301197)), keep=Keep.TOP, mode=Mode.PRIVATE)
    fillet_1_piece_9 = fillet_1_piece_9 - Plane(origin=(13.5, -8.634898017, 0.198322878), x_dir=(0, 0.7431448254773979, 0.6691306063588544), z_dir=(0, 0.6691306063588544, -0.7431448254773979)) * Cylinder(4.5, 56, mode=Mode.PRIVATE)
    add(fillet_1_piece_9)
    with BuildSketch(Plane(origin=(-10, 5, 5), x_dir=(1, 0, 0), z_dir=(0, -1, 0))) as fillet_1_piece_10_section:
        with BuildLine():
            CenterArc((FILLET_1_R, FILLET_1_R), FILLET_1_R, 180, 90)
            Line((0, FILLET_1_R), (0, 0))
            Line((0, 0), (FILLET_1_R, 0))
        make_face()
    fillet_1_piece_10 = extrude(amount=21.652323405, mode=Mode.PRIVATE)
    fillet_1_piece_10 = split(fillet_1_piece_10, bisect_by=Plane(origin=(-9.315353327, -10.016611336, 6.773624645), z_dir=(0, 0.9893939239349115, -0.14525723142301197)), keep=Keep.TOP, mode=Mode.PRIVATE)
    fillet_1_piece_10 = fillet_1_piece_10 - Plane(origin=(-13.5, -8.634898015, 0.198322875), x_dir=(0, 0.7431448254773979, 0.6691306063588544), z_dir=(0, 0.6691306063588544, -0.7431448254773979)) * Cylinder(4.5, 56, mode=Mode.PRIVATE)
    add(fillet_1_piece_10)
    # the kernel refuses this fillet: 3 mm, written as the material it takes off along each edge
    with BuildSketch(Plane(origin=(23.5, 9.778026956, 18), x_dir=(0, 0, -1), z_dir=(0, -1, 0))) as fillet_1_2_piece_1:
        with BuildLine():
            CenterArc((FILLET_1_R * 0.637070260807, -FILLET_1_R), FILLET_1_R, 90, 65)
            Line((-FILLET_1_R * 0.269237526229, -FILLET_1_R * 0.577381738259), (0, 0))
            Line((0, 0), (FILLET_1_R * 0.637070260807, 0))
        make_face()
    extrude(amount=22.924472184, mode=Mode.SUBTRACT)
    with BuildSketch(Plane(origin=(23.5, 9.778026956, 67), x_dir=(0, 0, 1), z_dir=(0, -1, 0)), Plane(origin=(-23.5, 9.778026956, 67), x_dir=(0.9063077870366487, 0, -0.4226182617407022), z_dir=(0, -1, 0))) as fillet_1_2_piece_2:
        with BuildLine():
            CenterArc((FILLET_1_R * 0.637070260807, FILLET_1_R), FILLET_1_R, 205, 65)
            Line((-FILLET_1_R * 0.269237526229, FILLET_1_R * 0.577381738259), (0, 0))
            Line((0, 0), (FILLET_1_R * 0.637070260807, 0))
        make_face()
    extrude(amount=15.730568757, mode=Mode.SUBTRACT)
    with BuildSketch(Plane(origin=(23.5, -7.5, 75), x_dir=(-1, 0, 0), z_dir=(0, 1, 0))) as fillet_1_2_piece_3:
        with BuildLine():
            CenterArc((FILLET_1_R, -FILLET_1_R), FILLET_1_R, 90, 90)
            Line((0, -FILLET_1_R), (0, 0))
            Line((0, 0), (FILLET_1_R, 0))
        make_face()
    extrude(amount=20, mode=Mode.SUBTRACT)
    with BuildSketch(Plane(origin=(15, 8.106601718, 75), x_dir=(-0.7071067811865526, 0, -0.7071067811865426), z_dir=(0, -1, 0)), Plane(origin=(-15, 8.106601718, 75), x_dir=(-1, 0, 0), z_dir=(0, -1, 0))) as fillet_1_2_piece_4:
        with BuildLine():
            CenterArc((FILLET_1_R * 0.414213562373, FILLET_1_R), FILLET_1_R, 225, 45)
            Line((-FILLET_1_R * 0.292893218813, FILLET_1_R * 0.292893218813), (0, 0))
            Line((0, 0), (FILLET_1_R * 0.414213562373, 0))
        make_face()
    extrude(amount=11.213203436, mode=Mode.SUBTRACT)
    with BuildSketch(Plane(origin=(-23.5, -7.5, 75), x_dir=(1, 0, 0), z_dir=(0, 1, 0))) as fillet_1_2_piece_5:
        with BuildLine():
            CenterArc((FILLET_1_R, FILLET_1_R), FILLET_1_R, 180, 90)
            Line((0, FILLET_1_R), (0, 0))
            Line((0, 0), (FILLET_1_R, 0))
        make_face()
    extrude(amount=20, mode=Mode.SUBTRACT)
    with BuildSketch(Plane(origin=(-23.5, 9.778026956, 18), x_dir=(0, 0, -1), z_dir=(0, -1, 0))) as fillet_1_2_piece_6:
        with BuildLine():
            CenterArc((FILLET_1_R * 0.637070260807, FILLET_1_R), FILLET_1_R, 205, 65)
            Line((-FILLET_1_R * 0.269237526229, FILLET_1_R * 0.577381738259), (0, 0))
            Line((0, 0), (FILLET_1_R * 0.637070260807, 0))
        make_face()
    extrude(amount=22.924472184, mode=Mode.SUBTRACT)

    # 草图10 → 切除-拉伸7 (cut, through all)
    with BuildSketch(Plane.ZY.offset(15.5)):
        Polygon((23.641672048, 5), (23.641672048, 0.5), (61.358327952, 3), (61.358327952, 5), align=None)
    extrude(amount=-CUT_EXTRUDE_7_DEPTH, mode=Mode.SUBTRACT)


solid = part.part
